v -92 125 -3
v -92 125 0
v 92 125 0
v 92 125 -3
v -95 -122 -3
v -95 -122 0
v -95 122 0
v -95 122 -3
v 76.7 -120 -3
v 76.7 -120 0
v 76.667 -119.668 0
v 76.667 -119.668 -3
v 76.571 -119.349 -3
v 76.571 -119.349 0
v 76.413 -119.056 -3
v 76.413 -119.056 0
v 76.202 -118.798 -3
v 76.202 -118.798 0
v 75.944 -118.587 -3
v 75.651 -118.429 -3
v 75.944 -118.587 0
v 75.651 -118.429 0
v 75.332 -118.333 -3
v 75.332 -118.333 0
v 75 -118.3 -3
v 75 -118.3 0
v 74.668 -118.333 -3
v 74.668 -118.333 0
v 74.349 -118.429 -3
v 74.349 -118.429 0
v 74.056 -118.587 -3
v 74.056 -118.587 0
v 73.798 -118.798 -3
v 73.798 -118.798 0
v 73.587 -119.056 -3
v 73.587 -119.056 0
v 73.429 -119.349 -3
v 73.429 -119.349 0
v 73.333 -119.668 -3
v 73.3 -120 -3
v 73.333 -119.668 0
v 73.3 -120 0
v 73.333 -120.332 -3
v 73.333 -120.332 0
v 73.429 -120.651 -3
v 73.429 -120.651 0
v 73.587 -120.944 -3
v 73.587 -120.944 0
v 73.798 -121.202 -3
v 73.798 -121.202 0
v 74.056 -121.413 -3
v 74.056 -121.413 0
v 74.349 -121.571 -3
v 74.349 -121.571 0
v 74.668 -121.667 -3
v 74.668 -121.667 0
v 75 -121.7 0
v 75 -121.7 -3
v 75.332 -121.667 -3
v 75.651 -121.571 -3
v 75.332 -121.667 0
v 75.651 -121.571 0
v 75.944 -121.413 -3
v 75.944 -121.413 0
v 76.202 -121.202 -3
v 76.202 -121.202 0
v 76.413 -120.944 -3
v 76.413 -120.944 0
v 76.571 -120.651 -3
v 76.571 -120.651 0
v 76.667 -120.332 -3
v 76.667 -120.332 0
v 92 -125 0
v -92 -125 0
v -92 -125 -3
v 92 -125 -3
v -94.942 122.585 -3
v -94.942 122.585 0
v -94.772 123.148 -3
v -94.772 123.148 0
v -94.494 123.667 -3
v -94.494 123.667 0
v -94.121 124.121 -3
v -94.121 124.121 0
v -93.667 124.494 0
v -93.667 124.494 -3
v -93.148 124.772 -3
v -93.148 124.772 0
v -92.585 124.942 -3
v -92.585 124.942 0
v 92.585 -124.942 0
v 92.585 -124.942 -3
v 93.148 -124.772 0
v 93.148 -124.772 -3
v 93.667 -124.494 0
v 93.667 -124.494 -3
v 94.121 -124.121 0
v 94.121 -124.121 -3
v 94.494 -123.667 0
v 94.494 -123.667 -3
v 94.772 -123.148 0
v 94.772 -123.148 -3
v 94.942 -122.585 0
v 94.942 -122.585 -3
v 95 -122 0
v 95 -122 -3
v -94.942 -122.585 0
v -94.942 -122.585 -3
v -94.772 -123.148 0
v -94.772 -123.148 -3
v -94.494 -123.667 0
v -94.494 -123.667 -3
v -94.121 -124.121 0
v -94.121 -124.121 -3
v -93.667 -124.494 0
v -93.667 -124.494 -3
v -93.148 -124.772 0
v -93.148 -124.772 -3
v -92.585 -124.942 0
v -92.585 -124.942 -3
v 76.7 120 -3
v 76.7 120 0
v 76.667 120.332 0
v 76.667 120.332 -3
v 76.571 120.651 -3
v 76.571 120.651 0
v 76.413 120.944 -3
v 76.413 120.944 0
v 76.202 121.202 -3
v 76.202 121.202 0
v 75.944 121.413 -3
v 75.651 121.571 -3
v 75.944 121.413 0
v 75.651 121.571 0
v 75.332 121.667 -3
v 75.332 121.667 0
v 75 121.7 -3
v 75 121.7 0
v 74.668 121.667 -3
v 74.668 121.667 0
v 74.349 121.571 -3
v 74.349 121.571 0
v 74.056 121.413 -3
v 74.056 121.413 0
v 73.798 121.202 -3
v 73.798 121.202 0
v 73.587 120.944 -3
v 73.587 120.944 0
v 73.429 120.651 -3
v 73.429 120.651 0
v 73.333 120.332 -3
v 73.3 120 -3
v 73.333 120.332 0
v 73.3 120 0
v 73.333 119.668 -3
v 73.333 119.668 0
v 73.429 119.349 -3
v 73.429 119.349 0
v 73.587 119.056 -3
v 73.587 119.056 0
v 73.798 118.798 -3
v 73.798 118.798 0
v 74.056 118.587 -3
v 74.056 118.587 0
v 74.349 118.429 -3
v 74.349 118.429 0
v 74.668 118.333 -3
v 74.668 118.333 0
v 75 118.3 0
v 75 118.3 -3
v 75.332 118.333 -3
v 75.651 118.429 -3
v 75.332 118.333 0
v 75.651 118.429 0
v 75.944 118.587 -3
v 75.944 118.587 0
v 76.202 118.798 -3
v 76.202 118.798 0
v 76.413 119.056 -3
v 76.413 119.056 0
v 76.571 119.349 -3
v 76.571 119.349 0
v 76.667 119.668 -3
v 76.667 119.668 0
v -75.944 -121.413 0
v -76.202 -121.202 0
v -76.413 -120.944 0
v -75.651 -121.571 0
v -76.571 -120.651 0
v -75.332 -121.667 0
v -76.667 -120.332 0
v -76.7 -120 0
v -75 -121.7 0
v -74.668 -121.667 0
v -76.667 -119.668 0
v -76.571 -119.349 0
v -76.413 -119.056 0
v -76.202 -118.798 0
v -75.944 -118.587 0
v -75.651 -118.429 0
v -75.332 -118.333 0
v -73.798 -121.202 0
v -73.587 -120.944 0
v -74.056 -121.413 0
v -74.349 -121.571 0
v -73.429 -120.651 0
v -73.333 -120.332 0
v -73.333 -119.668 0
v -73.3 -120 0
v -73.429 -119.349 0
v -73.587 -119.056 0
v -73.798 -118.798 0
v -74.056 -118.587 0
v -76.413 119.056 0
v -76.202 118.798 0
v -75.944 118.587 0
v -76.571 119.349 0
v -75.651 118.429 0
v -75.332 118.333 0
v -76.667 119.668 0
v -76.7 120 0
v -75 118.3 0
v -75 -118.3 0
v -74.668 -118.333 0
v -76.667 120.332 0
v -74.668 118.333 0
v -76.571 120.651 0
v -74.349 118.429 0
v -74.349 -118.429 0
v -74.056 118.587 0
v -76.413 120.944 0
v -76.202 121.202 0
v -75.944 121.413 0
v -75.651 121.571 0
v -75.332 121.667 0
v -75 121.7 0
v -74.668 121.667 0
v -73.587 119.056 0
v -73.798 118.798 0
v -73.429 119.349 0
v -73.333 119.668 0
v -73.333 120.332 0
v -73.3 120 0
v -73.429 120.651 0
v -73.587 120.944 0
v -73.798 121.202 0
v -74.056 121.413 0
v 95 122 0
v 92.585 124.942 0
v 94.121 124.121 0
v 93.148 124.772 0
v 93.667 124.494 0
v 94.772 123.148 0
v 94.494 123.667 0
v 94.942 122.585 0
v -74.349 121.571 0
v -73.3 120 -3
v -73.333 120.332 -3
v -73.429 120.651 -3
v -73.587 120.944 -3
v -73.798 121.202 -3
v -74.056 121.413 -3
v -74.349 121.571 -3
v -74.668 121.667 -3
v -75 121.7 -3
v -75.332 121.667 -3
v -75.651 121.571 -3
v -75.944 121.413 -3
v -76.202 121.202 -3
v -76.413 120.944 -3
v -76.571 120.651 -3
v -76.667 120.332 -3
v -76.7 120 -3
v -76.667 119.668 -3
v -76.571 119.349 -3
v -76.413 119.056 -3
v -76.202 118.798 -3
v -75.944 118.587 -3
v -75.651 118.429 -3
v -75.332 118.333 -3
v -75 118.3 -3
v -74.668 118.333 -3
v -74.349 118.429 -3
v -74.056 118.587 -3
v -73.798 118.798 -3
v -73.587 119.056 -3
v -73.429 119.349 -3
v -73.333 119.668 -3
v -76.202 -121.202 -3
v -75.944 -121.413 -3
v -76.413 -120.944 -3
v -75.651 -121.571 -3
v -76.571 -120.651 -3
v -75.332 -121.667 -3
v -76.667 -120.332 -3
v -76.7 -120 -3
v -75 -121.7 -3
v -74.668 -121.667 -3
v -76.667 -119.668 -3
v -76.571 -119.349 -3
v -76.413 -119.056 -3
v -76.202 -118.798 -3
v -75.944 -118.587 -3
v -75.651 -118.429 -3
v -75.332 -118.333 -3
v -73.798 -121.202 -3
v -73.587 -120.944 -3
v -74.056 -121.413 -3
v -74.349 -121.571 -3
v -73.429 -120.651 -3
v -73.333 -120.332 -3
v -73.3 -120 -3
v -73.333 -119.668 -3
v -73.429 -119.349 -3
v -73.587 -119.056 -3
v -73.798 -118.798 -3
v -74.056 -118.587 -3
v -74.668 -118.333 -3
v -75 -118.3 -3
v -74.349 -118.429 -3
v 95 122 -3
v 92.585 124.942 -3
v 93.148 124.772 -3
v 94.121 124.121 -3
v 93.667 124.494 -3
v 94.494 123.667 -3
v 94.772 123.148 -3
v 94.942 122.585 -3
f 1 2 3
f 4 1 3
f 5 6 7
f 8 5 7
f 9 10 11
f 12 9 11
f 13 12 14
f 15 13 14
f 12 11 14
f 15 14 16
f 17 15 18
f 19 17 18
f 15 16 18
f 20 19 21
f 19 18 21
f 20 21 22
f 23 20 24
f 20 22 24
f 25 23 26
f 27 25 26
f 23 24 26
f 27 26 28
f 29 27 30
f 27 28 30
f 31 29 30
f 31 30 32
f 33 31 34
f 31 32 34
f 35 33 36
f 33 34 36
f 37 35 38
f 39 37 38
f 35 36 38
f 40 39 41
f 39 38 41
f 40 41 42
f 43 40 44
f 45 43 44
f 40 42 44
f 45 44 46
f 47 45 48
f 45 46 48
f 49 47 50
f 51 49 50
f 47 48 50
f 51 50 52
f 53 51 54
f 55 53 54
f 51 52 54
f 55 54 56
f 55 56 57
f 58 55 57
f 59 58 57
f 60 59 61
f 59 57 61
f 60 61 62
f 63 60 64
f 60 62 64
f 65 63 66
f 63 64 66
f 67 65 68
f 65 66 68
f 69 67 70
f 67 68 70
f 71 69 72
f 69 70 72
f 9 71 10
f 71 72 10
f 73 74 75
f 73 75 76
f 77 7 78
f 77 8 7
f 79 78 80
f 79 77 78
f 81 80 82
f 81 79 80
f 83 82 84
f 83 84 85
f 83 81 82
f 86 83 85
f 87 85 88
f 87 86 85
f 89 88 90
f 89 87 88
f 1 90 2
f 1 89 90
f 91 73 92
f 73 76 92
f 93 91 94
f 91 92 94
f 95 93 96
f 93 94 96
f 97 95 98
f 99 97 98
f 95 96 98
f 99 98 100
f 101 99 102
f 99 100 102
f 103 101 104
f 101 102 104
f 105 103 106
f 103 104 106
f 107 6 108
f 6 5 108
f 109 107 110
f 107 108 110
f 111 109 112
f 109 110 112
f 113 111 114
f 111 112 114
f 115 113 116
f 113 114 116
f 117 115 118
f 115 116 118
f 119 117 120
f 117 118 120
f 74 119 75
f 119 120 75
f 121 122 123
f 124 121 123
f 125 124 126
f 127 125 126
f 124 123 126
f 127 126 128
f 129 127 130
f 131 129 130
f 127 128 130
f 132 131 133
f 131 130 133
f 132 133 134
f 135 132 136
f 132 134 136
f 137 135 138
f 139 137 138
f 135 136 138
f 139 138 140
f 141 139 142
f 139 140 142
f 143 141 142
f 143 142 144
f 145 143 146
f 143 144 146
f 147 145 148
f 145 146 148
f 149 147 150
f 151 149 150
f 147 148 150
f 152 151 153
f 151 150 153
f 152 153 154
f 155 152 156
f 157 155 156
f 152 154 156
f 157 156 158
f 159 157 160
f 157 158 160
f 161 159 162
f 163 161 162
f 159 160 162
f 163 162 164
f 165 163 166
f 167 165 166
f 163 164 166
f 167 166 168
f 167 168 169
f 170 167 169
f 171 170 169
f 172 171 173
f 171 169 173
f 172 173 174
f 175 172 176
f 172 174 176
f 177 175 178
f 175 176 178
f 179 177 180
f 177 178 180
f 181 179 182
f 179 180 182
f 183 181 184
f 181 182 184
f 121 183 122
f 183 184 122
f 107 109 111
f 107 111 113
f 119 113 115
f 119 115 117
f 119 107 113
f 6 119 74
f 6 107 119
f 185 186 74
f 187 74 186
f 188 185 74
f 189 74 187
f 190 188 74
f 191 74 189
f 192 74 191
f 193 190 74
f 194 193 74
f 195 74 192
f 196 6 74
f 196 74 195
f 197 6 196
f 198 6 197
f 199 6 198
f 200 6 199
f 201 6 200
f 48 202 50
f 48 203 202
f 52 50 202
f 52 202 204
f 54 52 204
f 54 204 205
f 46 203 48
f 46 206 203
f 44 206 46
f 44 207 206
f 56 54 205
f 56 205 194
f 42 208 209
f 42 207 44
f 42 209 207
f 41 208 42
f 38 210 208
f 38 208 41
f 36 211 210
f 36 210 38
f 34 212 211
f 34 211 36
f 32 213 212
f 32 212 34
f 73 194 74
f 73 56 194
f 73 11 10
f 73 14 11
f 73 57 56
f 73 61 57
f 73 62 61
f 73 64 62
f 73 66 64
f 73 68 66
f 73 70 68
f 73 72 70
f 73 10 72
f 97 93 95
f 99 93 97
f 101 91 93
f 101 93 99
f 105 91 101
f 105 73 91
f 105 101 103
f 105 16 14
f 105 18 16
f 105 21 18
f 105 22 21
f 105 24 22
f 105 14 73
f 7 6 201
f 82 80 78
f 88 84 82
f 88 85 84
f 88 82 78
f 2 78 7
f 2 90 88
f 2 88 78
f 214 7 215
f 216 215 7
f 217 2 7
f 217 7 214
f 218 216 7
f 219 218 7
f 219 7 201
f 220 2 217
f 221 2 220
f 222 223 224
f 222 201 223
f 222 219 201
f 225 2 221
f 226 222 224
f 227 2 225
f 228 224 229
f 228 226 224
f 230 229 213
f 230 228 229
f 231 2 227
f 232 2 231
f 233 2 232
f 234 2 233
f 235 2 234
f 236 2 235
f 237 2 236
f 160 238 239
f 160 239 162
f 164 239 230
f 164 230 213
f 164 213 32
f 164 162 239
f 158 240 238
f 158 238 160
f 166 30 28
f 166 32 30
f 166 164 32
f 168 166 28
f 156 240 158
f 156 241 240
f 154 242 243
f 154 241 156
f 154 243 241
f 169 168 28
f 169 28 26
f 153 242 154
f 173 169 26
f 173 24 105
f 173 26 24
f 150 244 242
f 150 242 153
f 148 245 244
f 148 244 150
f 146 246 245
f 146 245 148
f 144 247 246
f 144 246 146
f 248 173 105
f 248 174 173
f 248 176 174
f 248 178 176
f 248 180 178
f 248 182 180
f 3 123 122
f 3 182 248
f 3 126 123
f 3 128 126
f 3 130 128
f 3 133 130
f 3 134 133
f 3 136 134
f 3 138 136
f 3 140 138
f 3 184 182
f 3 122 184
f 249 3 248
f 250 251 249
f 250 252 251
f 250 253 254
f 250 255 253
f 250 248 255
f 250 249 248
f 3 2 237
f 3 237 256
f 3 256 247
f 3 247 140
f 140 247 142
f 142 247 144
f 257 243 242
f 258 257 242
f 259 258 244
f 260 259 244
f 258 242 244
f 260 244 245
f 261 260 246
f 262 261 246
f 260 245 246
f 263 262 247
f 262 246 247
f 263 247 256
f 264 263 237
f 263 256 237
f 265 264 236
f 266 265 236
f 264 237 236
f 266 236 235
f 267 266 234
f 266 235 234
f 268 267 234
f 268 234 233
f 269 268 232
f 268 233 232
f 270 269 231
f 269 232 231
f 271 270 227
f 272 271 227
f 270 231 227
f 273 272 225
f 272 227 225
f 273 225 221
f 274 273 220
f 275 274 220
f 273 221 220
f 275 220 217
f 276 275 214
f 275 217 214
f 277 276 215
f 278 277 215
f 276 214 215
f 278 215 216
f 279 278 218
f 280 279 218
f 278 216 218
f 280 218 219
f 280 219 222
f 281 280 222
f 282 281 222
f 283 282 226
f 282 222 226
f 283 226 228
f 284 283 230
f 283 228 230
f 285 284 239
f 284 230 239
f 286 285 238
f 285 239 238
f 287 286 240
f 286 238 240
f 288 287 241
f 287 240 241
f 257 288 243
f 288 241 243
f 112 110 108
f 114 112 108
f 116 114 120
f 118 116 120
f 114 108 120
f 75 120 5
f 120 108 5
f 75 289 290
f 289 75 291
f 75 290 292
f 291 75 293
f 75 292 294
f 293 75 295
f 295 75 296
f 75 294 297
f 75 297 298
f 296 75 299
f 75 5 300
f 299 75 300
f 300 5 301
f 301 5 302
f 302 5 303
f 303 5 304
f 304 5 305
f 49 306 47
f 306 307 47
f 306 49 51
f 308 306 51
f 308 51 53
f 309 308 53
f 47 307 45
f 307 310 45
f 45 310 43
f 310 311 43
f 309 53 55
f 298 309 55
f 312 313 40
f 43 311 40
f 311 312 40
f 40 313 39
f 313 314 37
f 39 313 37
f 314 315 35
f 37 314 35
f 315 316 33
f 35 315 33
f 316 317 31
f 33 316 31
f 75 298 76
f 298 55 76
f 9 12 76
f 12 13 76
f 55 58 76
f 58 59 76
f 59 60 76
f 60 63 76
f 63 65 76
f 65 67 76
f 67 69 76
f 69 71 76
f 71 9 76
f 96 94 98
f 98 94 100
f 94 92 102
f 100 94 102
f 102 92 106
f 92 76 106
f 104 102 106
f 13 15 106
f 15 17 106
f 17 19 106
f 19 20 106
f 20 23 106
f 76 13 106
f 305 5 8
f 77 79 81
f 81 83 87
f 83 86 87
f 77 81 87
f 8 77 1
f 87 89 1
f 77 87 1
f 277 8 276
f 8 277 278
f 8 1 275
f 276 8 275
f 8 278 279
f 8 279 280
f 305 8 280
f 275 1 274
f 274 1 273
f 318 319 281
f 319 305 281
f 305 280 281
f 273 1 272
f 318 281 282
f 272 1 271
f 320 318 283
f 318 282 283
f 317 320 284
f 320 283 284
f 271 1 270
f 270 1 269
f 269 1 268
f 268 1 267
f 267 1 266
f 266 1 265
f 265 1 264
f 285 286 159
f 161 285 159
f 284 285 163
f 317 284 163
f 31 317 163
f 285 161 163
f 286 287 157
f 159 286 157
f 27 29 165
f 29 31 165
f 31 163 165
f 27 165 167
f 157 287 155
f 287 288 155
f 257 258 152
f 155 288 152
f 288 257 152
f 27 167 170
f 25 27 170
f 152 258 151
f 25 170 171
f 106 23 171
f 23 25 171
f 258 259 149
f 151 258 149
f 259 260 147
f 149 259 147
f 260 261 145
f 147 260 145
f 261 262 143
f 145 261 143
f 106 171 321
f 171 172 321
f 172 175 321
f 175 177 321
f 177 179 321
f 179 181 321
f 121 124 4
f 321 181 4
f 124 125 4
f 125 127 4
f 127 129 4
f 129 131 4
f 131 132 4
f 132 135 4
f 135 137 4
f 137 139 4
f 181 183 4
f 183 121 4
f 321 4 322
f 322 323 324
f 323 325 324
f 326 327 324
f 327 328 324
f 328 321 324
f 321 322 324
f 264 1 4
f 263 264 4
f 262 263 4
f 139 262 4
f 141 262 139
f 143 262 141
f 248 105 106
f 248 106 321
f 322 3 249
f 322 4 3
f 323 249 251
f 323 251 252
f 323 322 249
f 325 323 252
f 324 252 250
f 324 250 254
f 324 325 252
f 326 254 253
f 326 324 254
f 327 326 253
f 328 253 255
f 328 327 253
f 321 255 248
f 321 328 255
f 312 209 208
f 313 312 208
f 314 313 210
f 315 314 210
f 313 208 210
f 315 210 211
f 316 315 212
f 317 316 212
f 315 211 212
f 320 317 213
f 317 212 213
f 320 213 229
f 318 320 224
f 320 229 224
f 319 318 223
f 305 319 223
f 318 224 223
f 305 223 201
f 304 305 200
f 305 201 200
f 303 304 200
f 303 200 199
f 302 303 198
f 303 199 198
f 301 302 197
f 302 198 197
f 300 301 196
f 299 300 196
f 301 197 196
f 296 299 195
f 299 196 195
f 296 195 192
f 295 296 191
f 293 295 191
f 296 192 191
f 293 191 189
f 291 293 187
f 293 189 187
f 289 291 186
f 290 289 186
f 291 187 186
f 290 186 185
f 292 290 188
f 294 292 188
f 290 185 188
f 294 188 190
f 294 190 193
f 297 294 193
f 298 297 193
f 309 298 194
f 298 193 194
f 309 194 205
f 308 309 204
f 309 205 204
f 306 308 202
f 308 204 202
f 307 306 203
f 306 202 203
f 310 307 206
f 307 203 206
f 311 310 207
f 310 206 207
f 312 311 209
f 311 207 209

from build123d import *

# Parameters (mm, degrees)
F0_W     = 190
F0_H     = 250
F0_R     = 1.7
F1_DEPTH = 3
F2_R     = 3


with BuildPart() as f1:
    # F0 (on Top) → F1 (new body)
    with BuildSketch(Plane.XY):
        Rectangle(F0_W, F0_H)
        with Locations((-75, -120)):
            Circle(F0_R, mode=Mode.SUBTRACT)
        with Locations((75, -120)):
            Circle(F0_R, mode=Mode.SUBTRACT)
        with Locations((-75, 120)):
            Circle(F0_R, mode=Mode.SUBTRACT)
        with Locations((75, 120)):
            Circle(F0_R, mode=Mode.SUBTRACT)
    extrude(amount=-F1_DEPTH)

    # F2
    f2_edges = [f1.edges().sort_by_distance(p)[0] for p in [
        (95, 125, -1.5),
        (-95, 125, -1.5),
        (95, -125, -1.5),
        (-95, -125, -1.5),
    ]]
    fillet(f2_edges, radius=F2_R)


solid = f1.part
